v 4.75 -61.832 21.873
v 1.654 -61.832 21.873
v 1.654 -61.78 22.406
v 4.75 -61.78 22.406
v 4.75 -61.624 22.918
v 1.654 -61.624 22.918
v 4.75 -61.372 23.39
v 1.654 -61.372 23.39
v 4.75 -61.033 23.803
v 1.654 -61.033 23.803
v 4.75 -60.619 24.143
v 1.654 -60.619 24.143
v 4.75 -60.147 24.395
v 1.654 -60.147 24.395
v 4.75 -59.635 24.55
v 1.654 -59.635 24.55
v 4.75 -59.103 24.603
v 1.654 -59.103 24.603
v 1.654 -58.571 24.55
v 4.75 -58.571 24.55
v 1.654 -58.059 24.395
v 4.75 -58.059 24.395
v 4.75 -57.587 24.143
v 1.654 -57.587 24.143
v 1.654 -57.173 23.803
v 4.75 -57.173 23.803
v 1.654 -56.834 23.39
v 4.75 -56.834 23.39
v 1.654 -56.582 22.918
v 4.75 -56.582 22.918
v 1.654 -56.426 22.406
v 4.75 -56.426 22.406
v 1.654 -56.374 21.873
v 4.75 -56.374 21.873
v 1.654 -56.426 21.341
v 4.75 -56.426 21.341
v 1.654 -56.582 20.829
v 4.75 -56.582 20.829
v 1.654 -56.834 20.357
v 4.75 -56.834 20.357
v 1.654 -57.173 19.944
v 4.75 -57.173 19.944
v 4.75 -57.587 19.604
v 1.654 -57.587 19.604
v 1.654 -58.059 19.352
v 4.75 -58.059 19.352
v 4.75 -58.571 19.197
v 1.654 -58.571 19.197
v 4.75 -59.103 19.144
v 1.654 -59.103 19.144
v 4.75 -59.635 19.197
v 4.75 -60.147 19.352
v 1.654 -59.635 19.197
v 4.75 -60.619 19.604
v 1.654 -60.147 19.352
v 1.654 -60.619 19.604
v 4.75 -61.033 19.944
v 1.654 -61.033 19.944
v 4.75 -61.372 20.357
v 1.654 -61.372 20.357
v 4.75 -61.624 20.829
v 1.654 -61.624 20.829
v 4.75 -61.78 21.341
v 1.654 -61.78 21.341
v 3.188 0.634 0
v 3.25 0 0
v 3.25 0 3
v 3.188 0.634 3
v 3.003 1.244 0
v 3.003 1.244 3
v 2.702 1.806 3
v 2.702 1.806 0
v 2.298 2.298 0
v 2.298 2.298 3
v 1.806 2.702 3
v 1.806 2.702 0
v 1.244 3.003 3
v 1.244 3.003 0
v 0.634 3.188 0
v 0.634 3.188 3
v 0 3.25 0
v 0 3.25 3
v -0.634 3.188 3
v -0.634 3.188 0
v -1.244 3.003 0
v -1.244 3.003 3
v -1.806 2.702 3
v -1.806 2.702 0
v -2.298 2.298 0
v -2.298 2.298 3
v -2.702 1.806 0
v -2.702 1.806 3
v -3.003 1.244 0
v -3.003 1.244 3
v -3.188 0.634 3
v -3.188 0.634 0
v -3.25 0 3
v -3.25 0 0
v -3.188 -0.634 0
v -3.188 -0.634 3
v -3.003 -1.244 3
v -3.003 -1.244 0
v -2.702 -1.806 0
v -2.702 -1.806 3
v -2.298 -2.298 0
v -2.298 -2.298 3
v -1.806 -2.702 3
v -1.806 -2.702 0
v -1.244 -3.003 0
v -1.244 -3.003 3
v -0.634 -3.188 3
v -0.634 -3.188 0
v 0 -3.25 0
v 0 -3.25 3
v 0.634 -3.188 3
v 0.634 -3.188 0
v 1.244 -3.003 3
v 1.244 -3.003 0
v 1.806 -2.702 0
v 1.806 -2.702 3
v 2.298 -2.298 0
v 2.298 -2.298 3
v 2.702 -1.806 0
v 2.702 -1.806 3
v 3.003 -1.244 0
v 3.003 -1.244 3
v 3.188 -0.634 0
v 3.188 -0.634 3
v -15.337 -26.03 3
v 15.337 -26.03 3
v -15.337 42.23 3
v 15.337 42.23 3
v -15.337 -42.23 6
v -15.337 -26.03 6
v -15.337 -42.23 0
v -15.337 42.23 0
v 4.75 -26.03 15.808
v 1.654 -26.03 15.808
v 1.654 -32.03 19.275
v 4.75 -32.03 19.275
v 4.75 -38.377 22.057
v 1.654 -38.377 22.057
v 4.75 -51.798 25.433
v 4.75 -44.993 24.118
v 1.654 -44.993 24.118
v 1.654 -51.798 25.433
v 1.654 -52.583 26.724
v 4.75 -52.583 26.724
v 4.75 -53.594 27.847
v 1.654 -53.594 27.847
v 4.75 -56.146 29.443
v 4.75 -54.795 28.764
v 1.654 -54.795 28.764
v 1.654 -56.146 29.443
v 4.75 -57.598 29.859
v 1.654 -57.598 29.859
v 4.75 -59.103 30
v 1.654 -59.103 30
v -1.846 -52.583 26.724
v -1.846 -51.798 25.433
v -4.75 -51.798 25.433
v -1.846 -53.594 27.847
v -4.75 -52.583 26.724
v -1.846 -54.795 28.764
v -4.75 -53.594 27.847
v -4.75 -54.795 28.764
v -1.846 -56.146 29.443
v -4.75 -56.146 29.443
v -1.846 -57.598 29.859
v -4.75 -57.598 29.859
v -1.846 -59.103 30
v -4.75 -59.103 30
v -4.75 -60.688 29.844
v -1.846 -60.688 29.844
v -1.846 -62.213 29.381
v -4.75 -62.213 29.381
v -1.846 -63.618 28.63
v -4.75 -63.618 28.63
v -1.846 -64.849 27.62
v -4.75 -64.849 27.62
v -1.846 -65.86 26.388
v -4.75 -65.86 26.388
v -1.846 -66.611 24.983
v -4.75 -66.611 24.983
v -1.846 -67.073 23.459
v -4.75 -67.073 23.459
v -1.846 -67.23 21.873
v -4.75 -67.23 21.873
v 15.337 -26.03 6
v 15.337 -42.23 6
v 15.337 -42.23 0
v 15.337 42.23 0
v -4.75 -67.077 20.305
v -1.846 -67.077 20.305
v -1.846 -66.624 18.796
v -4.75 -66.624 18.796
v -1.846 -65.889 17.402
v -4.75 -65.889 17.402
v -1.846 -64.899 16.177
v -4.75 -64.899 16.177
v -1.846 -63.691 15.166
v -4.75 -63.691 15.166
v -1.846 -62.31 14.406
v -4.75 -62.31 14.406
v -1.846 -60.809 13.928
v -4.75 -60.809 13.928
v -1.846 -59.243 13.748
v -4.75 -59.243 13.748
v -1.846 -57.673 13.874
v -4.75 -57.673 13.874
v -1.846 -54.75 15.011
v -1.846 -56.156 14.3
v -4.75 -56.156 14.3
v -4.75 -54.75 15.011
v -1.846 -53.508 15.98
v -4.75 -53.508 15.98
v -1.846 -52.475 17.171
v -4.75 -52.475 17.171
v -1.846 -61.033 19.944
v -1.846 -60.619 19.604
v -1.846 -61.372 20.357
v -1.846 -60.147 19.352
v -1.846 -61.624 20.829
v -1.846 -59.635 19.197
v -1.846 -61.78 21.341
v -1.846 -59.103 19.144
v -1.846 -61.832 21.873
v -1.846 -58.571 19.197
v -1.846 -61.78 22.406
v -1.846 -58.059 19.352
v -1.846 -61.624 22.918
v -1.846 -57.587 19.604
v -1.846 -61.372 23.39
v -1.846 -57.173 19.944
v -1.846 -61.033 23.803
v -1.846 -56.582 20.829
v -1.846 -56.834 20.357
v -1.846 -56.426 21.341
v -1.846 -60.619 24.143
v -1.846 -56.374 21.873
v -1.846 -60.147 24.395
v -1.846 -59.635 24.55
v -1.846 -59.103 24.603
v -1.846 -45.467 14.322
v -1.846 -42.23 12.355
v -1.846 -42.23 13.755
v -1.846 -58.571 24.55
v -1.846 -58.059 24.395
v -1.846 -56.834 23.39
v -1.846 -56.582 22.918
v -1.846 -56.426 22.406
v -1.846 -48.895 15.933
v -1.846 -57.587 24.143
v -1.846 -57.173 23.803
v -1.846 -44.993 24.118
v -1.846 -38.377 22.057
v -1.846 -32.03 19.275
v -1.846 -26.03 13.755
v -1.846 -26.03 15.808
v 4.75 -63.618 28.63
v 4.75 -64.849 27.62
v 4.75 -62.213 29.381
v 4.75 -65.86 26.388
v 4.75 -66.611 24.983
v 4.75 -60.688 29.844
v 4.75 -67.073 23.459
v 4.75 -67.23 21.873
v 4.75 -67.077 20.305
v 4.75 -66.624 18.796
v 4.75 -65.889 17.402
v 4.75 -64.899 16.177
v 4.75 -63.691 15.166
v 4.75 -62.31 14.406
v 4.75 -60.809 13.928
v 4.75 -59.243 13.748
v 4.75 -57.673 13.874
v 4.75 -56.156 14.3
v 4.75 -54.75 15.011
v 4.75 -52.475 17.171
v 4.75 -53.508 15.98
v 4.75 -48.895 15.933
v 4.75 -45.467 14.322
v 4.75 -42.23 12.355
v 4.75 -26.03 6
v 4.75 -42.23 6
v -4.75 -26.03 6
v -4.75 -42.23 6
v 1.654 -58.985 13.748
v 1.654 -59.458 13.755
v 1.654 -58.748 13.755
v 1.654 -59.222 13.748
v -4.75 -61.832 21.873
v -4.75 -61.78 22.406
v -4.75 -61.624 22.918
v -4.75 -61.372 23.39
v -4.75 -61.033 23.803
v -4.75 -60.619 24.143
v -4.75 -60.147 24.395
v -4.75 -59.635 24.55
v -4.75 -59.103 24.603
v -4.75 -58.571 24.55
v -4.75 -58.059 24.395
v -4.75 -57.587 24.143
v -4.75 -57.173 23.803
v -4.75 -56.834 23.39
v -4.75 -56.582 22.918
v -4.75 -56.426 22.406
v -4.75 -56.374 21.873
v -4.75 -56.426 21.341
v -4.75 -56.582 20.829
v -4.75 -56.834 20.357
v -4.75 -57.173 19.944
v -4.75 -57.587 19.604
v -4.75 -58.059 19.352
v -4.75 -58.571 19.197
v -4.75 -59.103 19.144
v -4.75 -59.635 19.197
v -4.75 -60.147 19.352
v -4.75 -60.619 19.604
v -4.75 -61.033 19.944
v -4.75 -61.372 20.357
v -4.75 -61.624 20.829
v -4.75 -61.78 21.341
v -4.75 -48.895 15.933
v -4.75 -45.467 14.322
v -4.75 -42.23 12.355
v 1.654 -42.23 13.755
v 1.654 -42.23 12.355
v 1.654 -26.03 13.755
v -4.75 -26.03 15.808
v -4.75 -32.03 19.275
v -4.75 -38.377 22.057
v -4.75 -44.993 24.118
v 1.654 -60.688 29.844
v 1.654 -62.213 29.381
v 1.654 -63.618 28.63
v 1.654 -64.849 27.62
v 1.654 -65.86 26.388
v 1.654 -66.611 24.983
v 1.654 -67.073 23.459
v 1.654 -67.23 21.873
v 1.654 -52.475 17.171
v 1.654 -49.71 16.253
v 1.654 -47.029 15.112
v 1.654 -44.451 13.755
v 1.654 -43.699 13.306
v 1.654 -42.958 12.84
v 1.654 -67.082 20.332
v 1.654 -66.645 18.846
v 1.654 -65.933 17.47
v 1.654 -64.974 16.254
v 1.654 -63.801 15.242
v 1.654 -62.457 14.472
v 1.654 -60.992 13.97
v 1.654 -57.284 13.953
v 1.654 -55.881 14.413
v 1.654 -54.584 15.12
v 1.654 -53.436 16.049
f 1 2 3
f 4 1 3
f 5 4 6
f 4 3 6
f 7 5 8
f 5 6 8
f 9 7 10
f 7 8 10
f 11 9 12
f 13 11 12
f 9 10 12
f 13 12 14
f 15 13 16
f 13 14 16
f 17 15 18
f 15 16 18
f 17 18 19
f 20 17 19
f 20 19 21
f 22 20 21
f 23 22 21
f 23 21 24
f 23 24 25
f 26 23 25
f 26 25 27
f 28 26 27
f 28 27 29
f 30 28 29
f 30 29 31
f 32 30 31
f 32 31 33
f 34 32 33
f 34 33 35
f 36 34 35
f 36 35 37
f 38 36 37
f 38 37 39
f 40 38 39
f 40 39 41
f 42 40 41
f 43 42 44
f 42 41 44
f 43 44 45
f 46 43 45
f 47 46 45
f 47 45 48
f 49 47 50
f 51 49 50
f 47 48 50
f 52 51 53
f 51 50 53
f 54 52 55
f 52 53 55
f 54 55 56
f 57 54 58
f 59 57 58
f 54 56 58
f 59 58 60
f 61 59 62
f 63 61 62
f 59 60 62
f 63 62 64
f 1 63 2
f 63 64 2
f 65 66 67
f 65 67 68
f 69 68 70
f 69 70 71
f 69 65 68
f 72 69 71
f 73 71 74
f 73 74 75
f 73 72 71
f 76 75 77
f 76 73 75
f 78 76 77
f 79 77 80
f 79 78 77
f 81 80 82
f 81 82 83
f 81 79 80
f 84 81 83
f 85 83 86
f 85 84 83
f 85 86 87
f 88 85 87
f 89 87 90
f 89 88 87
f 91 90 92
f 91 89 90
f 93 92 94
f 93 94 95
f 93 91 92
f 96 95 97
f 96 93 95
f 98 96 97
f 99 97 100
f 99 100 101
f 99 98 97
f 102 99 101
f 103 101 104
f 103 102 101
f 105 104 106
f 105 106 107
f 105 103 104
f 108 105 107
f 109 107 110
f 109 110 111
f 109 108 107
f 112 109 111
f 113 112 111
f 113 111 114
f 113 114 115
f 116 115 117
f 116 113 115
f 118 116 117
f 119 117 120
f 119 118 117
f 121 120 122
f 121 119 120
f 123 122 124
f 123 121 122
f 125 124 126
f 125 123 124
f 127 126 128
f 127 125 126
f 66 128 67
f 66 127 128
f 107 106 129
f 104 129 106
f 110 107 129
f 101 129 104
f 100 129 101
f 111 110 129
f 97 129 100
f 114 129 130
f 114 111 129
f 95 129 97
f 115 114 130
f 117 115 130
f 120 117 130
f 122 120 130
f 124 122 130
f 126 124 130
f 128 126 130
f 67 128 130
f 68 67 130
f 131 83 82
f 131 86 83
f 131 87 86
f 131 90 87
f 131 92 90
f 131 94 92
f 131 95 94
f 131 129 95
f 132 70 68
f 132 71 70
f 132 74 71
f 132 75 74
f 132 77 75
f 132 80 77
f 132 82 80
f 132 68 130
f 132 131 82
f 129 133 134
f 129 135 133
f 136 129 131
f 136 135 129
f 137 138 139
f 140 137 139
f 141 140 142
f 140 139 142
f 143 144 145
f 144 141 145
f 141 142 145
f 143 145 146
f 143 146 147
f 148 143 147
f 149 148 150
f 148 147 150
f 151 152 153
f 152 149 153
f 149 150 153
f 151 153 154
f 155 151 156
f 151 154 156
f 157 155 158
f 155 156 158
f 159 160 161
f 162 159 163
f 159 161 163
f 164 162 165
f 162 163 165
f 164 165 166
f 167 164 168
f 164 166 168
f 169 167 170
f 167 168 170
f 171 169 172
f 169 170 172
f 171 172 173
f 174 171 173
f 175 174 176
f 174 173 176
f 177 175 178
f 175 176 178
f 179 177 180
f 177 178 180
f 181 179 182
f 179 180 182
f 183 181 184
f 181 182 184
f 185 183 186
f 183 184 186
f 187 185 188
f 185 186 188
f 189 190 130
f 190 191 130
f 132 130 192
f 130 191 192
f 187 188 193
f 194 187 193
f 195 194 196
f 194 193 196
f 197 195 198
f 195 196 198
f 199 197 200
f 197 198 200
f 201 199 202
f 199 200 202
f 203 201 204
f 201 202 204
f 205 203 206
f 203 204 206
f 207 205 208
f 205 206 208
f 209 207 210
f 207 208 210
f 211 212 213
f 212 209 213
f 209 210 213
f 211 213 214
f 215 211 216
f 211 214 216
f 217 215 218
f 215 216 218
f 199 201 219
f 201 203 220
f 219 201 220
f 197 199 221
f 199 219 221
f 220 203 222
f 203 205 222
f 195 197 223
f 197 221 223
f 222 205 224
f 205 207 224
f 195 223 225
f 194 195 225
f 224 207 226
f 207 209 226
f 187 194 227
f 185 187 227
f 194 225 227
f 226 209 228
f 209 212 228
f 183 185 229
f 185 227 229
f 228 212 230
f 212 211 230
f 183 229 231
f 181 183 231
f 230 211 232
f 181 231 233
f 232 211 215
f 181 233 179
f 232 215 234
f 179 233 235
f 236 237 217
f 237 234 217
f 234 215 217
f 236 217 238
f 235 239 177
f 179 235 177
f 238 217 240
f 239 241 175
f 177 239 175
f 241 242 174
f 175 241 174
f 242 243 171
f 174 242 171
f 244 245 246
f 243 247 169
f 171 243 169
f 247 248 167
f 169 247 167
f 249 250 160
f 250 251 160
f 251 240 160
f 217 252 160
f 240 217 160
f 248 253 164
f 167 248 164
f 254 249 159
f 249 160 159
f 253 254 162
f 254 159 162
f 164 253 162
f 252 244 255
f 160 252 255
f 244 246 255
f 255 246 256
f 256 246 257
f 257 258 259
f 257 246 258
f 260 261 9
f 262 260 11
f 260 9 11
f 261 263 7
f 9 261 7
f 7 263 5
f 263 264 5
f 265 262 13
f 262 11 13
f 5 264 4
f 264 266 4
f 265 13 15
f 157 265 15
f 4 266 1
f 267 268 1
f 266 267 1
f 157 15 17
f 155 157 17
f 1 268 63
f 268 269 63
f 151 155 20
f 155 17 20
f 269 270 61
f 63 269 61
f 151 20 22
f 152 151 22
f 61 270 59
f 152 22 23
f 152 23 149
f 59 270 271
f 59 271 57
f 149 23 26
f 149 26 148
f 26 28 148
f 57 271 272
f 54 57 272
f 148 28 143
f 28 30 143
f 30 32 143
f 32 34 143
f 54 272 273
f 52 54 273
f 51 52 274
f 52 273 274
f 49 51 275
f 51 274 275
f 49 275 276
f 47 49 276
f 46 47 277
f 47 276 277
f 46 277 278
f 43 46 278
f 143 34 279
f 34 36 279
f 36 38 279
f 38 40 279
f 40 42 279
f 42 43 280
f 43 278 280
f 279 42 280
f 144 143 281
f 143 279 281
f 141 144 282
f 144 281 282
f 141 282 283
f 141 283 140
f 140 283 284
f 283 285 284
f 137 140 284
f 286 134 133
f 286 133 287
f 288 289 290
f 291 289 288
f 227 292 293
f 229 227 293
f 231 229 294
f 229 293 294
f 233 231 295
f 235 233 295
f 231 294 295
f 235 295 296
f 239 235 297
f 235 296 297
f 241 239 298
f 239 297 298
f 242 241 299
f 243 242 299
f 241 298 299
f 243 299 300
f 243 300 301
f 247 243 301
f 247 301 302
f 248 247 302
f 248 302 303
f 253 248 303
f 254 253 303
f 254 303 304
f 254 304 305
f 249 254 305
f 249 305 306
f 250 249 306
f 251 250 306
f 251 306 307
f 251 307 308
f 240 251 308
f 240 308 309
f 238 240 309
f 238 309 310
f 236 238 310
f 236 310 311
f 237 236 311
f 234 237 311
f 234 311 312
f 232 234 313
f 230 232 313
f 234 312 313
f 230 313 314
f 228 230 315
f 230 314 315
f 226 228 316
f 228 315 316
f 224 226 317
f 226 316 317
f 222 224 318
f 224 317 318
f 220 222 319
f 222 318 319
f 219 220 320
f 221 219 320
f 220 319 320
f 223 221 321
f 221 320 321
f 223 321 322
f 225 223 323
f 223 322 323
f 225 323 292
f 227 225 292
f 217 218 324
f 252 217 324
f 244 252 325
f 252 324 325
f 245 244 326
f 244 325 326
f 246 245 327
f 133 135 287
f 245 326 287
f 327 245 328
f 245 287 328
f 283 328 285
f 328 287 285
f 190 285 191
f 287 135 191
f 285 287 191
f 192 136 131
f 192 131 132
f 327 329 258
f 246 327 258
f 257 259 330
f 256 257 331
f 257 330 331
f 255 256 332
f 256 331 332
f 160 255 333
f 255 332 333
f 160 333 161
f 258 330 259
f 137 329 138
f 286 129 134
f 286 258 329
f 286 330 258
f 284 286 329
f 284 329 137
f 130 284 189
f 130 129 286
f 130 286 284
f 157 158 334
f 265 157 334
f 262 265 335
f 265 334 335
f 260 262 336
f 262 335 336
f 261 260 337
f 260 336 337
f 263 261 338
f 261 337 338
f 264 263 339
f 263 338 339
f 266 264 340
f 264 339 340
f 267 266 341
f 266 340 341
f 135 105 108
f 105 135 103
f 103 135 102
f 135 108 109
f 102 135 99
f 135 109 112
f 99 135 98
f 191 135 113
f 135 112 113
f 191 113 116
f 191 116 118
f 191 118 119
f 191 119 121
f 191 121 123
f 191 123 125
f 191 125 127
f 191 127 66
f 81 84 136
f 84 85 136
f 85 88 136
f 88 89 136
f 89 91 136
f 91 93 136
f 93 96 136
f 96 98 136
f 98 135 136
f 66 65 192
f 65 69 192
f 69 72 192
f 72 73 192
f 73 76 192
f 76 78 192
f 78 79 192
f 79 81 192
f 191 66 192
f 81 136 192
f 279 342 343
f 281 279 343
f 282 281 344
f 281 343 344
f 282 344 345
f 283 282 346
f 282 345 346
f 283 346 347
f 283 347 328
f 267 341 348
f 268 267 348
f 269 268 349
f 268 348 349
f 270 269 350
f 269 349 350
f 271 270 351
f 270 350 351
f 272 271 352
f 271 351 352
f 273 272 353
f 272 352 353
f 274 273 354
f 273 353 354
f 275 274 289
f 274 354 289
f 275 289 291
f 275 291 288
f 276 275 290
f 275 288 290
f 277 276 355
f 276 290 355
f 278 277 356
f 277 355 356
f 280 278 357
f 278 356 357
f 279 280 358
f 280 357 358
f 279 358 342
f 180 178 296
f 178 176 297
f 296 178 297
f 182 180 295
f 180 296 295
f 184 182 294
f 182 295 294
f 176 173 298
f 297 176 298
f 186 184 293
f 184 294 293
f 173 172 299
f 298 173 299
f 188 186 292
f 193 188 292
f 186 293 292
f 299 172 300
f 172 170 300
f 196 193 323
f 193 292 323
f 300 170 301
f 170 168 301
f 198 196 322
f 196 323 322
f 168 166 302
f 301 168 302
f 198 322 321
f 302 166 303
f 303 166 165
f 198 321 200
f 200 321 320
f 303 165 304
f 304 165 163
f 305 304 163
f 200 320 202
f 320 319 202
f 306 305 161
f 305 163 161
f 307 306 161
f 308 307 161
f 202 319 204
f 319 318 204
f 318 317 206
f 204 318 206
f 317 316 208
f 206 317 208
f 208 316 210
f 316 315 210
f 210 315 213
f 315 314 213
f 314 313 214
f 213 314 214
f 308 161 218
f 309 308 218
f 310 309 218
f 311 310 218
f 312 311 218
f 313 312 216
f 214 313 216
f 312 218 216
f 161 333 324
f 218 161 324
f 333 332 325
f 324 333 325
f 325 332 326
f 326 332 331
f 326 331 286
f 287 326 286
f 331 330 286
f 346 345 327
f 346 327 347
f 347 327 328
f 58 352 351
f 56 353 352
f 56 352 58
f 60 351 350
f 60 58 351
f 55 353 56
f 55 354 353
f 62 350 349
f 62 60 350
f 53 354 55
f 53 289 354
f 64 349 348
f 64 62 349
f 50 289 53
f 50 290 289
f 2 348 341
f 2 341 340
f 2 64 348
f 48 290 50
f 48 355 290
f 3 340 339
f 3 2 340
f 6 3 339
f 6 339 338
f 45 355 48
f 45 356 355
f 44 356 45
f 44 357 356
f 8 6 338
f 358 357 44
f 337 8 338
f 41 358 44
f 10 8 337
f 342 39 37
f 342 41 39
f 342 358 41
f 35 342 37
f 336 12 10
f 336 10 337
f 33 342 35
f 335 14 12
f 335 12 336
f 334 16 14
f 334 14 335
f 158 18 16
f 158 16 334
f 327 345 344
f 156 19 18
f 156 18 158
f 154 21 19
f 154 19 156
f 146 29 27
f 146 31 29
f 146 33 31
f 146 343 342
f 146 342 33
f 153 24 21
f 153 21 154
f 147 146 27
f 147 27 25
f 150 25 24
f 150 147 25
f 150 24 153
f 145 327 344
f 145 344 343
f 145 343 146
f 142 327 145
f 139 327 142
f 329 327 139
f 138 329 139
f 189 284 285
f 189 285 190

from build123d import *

# Parameters (mm, degrees)
F0_W      = 30.6736361235
F0_H      = 84.459155798
F0_R      = 3.25
F1_DEPTH  = 3
F2_W      = 30.6736361235
F2_H      = 16.2
F3_DEPTH  = 3
F4_W      = 9.5
F4_H      = 16.2
F5_DEPTH  = 24
F6_W      = 3.5
F6_H      = 16.2452395454
F7_DEPTH  = 18
F9_DEPTH  = 25
F10_R     = 2.7291125689
F11_DEPTH = 20.0878180618


with BuildPart() as f1:
    # F0 (on Top) → F1 (new body)
    with BuildSketch(Plane.XY):
        Rectangle(F0_W, F0_H)
        Circle(F0_R, mode=Mode.SUBTRACT)
    extrude(amount=F1_DEPTH)

    # F2 (on face) → F3 (join)
    with BuildSketch(Plane.XY.offset(3)):
        with Locations((0, -34.129577899)):
            Rectangle(F2_W, F2_H)
    extrude(amount=F3_DEPTH)

    # F4 (on face) → F5 (join)
    with BuildSketch(Plane.XY.offset(6)):
        with Locations((0, -34.129577899)):
            Rectangle(F4_W, F4_H)
    extrude(amount=F5_DEPTH)

    # F6 (on face) → F7 (cut)
    with BuildSketch(Plane(origin=(0, -26.029577899, 0), x_dir=(-1, 0, 0), z_dir=(0, 1, 0))):
        with Locations((0.0963514363, 21.8773802273)):
            Rectangle(F6_W, F6_H)
    extrude(amount=-F7_DEPTH, mode=Mode.SUBTRACT)

    # F8 (on face) → F9 (join)
    with BuildSketch(Plane.XZ.offset(42.229577899)):
        Polygon((-1.8463514363, 30), (-4.75, 30), (-4.75, 12.3551307052), (-1.8463514363, 12.3551307052), (-1.8463514363, 13.7547604546), align=None)
        Polygon((4.75, 30), (1.6536485637, 30), (1.6536485637, 13.7547604546), (1.6540503129, 13.7547604546), (1.6540503129, 12.3551307052), (4.75, 12.3551307052), align=None)
    extrude(amount=F9_DEPTH)

    # F10 (on face) → F11 (cut, through all)
    with BuildSketch(Plane(origin=(-4.75, 0, 0), x_dir=(0, -1, 0), z_dir=(-1, 0, 0))):
        with BuildLine():
            Line((67.229577899, 30), (59.1030751607, 30))
            ThreePointArc((59.1030751607, 30), (64.8493803543, 27.6198024553), (67.229577899, 21.8734972618))
            Line((67.229577899, 21.8734972618), (67.229577899, 30))
        make_face()
        with BuildLine():
            Line((67.229577899, 12.3551307052), (67.229577899, 21.8734972618))
            ThreePointArc((67.229577899, 21.8734972618), (61.57093405, 14.1307768576), (52.4754527388, 17.1708737613))
            ThreePointArc((52.4754527388, 17.1708737613), (47.1597307325, 15.1731667126), (42.229577899, 12.3551307052))
            Line((42.229577899, 12.3551307052), (67.229577899, 12.3551307052))
        make_face()
        with Locations((59.1030751607, 21.8734972618)):
            Circle(F10_R)
        with BuildLine():
            Line((46.629577899, 30), (42.229577899, 30))
            Line((42.229577899, 30), (26.029577899, 30))
            Line((26.029577899, 30), (26.029577899, 28.4473763433))
            Line((26.029577899, 28.4473763433), (26.029577899, 15.8075261861))
            ThreePointArc((26.029577899, 15.8075261861), (38.3769053646, 22.0569473273), (51.7975745776, 25.4329505884))
            ThreePointArc((51.7975745776, 25.4329505884), (54.7952834092, 28.7642865475), (59.1030751607, 30))
            Line((59.1030751607, 30), (46.629577899, 30))
        make_face()
    extrude(amount=-F11_DEPTH, mode=Mode.SUBTRACT)


solid = f1.part
